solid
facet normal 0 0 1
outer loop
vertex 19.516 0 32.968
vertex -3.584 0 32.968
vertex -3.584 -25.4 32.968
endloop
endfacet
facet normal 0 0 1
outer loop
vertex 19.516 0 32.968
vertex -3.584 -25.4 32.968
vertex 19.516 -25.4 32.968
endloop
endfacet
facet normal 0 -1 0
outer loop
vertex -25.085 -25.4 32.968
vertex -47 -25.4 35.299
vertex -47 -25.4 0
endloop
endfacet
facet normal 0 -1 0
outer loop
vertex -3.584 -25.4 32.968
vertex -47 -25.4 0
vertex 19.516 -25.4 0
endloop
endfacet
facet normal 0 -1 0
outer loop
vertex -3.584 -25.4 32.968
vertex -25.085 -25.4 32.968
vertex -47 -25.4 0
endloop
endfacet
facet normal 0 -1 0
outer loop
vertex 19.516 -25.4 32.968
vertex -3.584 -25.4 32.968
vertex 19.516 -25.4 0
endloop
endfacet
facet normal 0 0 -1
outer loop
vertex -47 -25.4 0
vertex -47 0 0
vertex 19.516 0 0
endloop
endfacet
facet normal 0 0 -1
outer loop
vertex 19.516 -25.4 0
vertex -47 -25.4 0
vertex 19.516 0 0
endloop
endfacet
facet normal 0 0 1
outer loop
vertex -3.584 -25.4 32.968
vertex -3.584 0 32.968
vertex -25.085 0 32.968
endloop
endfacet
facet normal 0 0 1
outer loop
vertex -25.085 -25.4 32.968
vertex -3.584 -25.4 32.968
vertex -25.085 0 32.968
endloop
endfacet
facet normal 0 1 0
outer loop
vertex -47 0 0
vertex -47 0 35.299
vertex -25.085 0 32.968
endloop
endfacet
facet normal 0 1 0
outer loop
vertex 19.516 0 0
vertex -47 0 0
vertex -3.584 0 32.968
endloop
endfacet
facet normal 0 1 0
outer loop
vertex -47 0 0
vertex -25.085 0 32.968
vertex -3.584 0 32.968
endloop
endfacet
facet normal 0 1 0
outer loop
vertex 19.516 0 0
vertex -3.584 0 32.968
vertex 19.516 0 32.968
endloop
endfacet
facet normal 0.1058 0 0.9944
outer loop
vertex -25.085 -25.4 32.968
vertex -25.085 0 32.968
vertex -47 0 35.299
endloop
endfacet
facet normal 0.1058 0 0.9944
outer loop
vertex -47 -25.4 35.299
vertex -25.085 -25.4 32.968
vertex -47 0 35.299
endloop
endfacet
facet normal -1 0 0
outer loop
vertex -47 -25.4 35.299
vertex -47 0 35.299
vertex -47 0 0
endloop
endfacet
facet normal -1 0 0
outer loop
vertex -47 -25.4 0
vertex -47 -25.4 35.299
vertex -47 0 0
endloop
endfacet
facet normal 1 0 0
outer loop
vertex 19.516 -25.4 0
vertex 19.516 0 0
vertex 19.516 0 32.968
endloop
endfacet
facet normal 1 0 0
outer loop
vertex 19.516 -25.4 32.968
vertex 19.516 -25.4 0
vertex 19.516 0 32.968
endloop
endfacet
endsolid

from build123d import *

# Parameters (mm, degrees)
F0_W     = 21.91495
F0_H     = 6.17824
F0_W_2   = 23.099592
F0_H_2   = 6.216454
F0_H_3   = 26.751835
F2_DEPTH = 25.4


with BuildPart() as f2:
    # F0 (on Front) → F2 (new body)
    with BuildSketch(Plane.XZ):
        Polygon((-25.084568, 6.17824), (-25.084568, 32.968289), (-46.999518, 35.29929), (-46.999518, 6.17824), align=None)
        Polygon((-3.58351, 32.968289), (-25.084568, 32.968289), (-25.084568, 6.17824), (-25.084568, 0), (-3.58351, 0), (-3.58351, 6.216454), align=None)
        with Locations((-36.042043, 3.08912)):
            Rectangle(F0_W, F0_H)
        with Locations((7.966286, 3.108227)):
            Rectangle(F0_W_2, F0_H_2)
        with Locations((7.966286, 19.592371)):
            Rectangle(F0_W_2, F0_H_3)
    extrude(amount=F2_DEPTH)


solid = f2.part
